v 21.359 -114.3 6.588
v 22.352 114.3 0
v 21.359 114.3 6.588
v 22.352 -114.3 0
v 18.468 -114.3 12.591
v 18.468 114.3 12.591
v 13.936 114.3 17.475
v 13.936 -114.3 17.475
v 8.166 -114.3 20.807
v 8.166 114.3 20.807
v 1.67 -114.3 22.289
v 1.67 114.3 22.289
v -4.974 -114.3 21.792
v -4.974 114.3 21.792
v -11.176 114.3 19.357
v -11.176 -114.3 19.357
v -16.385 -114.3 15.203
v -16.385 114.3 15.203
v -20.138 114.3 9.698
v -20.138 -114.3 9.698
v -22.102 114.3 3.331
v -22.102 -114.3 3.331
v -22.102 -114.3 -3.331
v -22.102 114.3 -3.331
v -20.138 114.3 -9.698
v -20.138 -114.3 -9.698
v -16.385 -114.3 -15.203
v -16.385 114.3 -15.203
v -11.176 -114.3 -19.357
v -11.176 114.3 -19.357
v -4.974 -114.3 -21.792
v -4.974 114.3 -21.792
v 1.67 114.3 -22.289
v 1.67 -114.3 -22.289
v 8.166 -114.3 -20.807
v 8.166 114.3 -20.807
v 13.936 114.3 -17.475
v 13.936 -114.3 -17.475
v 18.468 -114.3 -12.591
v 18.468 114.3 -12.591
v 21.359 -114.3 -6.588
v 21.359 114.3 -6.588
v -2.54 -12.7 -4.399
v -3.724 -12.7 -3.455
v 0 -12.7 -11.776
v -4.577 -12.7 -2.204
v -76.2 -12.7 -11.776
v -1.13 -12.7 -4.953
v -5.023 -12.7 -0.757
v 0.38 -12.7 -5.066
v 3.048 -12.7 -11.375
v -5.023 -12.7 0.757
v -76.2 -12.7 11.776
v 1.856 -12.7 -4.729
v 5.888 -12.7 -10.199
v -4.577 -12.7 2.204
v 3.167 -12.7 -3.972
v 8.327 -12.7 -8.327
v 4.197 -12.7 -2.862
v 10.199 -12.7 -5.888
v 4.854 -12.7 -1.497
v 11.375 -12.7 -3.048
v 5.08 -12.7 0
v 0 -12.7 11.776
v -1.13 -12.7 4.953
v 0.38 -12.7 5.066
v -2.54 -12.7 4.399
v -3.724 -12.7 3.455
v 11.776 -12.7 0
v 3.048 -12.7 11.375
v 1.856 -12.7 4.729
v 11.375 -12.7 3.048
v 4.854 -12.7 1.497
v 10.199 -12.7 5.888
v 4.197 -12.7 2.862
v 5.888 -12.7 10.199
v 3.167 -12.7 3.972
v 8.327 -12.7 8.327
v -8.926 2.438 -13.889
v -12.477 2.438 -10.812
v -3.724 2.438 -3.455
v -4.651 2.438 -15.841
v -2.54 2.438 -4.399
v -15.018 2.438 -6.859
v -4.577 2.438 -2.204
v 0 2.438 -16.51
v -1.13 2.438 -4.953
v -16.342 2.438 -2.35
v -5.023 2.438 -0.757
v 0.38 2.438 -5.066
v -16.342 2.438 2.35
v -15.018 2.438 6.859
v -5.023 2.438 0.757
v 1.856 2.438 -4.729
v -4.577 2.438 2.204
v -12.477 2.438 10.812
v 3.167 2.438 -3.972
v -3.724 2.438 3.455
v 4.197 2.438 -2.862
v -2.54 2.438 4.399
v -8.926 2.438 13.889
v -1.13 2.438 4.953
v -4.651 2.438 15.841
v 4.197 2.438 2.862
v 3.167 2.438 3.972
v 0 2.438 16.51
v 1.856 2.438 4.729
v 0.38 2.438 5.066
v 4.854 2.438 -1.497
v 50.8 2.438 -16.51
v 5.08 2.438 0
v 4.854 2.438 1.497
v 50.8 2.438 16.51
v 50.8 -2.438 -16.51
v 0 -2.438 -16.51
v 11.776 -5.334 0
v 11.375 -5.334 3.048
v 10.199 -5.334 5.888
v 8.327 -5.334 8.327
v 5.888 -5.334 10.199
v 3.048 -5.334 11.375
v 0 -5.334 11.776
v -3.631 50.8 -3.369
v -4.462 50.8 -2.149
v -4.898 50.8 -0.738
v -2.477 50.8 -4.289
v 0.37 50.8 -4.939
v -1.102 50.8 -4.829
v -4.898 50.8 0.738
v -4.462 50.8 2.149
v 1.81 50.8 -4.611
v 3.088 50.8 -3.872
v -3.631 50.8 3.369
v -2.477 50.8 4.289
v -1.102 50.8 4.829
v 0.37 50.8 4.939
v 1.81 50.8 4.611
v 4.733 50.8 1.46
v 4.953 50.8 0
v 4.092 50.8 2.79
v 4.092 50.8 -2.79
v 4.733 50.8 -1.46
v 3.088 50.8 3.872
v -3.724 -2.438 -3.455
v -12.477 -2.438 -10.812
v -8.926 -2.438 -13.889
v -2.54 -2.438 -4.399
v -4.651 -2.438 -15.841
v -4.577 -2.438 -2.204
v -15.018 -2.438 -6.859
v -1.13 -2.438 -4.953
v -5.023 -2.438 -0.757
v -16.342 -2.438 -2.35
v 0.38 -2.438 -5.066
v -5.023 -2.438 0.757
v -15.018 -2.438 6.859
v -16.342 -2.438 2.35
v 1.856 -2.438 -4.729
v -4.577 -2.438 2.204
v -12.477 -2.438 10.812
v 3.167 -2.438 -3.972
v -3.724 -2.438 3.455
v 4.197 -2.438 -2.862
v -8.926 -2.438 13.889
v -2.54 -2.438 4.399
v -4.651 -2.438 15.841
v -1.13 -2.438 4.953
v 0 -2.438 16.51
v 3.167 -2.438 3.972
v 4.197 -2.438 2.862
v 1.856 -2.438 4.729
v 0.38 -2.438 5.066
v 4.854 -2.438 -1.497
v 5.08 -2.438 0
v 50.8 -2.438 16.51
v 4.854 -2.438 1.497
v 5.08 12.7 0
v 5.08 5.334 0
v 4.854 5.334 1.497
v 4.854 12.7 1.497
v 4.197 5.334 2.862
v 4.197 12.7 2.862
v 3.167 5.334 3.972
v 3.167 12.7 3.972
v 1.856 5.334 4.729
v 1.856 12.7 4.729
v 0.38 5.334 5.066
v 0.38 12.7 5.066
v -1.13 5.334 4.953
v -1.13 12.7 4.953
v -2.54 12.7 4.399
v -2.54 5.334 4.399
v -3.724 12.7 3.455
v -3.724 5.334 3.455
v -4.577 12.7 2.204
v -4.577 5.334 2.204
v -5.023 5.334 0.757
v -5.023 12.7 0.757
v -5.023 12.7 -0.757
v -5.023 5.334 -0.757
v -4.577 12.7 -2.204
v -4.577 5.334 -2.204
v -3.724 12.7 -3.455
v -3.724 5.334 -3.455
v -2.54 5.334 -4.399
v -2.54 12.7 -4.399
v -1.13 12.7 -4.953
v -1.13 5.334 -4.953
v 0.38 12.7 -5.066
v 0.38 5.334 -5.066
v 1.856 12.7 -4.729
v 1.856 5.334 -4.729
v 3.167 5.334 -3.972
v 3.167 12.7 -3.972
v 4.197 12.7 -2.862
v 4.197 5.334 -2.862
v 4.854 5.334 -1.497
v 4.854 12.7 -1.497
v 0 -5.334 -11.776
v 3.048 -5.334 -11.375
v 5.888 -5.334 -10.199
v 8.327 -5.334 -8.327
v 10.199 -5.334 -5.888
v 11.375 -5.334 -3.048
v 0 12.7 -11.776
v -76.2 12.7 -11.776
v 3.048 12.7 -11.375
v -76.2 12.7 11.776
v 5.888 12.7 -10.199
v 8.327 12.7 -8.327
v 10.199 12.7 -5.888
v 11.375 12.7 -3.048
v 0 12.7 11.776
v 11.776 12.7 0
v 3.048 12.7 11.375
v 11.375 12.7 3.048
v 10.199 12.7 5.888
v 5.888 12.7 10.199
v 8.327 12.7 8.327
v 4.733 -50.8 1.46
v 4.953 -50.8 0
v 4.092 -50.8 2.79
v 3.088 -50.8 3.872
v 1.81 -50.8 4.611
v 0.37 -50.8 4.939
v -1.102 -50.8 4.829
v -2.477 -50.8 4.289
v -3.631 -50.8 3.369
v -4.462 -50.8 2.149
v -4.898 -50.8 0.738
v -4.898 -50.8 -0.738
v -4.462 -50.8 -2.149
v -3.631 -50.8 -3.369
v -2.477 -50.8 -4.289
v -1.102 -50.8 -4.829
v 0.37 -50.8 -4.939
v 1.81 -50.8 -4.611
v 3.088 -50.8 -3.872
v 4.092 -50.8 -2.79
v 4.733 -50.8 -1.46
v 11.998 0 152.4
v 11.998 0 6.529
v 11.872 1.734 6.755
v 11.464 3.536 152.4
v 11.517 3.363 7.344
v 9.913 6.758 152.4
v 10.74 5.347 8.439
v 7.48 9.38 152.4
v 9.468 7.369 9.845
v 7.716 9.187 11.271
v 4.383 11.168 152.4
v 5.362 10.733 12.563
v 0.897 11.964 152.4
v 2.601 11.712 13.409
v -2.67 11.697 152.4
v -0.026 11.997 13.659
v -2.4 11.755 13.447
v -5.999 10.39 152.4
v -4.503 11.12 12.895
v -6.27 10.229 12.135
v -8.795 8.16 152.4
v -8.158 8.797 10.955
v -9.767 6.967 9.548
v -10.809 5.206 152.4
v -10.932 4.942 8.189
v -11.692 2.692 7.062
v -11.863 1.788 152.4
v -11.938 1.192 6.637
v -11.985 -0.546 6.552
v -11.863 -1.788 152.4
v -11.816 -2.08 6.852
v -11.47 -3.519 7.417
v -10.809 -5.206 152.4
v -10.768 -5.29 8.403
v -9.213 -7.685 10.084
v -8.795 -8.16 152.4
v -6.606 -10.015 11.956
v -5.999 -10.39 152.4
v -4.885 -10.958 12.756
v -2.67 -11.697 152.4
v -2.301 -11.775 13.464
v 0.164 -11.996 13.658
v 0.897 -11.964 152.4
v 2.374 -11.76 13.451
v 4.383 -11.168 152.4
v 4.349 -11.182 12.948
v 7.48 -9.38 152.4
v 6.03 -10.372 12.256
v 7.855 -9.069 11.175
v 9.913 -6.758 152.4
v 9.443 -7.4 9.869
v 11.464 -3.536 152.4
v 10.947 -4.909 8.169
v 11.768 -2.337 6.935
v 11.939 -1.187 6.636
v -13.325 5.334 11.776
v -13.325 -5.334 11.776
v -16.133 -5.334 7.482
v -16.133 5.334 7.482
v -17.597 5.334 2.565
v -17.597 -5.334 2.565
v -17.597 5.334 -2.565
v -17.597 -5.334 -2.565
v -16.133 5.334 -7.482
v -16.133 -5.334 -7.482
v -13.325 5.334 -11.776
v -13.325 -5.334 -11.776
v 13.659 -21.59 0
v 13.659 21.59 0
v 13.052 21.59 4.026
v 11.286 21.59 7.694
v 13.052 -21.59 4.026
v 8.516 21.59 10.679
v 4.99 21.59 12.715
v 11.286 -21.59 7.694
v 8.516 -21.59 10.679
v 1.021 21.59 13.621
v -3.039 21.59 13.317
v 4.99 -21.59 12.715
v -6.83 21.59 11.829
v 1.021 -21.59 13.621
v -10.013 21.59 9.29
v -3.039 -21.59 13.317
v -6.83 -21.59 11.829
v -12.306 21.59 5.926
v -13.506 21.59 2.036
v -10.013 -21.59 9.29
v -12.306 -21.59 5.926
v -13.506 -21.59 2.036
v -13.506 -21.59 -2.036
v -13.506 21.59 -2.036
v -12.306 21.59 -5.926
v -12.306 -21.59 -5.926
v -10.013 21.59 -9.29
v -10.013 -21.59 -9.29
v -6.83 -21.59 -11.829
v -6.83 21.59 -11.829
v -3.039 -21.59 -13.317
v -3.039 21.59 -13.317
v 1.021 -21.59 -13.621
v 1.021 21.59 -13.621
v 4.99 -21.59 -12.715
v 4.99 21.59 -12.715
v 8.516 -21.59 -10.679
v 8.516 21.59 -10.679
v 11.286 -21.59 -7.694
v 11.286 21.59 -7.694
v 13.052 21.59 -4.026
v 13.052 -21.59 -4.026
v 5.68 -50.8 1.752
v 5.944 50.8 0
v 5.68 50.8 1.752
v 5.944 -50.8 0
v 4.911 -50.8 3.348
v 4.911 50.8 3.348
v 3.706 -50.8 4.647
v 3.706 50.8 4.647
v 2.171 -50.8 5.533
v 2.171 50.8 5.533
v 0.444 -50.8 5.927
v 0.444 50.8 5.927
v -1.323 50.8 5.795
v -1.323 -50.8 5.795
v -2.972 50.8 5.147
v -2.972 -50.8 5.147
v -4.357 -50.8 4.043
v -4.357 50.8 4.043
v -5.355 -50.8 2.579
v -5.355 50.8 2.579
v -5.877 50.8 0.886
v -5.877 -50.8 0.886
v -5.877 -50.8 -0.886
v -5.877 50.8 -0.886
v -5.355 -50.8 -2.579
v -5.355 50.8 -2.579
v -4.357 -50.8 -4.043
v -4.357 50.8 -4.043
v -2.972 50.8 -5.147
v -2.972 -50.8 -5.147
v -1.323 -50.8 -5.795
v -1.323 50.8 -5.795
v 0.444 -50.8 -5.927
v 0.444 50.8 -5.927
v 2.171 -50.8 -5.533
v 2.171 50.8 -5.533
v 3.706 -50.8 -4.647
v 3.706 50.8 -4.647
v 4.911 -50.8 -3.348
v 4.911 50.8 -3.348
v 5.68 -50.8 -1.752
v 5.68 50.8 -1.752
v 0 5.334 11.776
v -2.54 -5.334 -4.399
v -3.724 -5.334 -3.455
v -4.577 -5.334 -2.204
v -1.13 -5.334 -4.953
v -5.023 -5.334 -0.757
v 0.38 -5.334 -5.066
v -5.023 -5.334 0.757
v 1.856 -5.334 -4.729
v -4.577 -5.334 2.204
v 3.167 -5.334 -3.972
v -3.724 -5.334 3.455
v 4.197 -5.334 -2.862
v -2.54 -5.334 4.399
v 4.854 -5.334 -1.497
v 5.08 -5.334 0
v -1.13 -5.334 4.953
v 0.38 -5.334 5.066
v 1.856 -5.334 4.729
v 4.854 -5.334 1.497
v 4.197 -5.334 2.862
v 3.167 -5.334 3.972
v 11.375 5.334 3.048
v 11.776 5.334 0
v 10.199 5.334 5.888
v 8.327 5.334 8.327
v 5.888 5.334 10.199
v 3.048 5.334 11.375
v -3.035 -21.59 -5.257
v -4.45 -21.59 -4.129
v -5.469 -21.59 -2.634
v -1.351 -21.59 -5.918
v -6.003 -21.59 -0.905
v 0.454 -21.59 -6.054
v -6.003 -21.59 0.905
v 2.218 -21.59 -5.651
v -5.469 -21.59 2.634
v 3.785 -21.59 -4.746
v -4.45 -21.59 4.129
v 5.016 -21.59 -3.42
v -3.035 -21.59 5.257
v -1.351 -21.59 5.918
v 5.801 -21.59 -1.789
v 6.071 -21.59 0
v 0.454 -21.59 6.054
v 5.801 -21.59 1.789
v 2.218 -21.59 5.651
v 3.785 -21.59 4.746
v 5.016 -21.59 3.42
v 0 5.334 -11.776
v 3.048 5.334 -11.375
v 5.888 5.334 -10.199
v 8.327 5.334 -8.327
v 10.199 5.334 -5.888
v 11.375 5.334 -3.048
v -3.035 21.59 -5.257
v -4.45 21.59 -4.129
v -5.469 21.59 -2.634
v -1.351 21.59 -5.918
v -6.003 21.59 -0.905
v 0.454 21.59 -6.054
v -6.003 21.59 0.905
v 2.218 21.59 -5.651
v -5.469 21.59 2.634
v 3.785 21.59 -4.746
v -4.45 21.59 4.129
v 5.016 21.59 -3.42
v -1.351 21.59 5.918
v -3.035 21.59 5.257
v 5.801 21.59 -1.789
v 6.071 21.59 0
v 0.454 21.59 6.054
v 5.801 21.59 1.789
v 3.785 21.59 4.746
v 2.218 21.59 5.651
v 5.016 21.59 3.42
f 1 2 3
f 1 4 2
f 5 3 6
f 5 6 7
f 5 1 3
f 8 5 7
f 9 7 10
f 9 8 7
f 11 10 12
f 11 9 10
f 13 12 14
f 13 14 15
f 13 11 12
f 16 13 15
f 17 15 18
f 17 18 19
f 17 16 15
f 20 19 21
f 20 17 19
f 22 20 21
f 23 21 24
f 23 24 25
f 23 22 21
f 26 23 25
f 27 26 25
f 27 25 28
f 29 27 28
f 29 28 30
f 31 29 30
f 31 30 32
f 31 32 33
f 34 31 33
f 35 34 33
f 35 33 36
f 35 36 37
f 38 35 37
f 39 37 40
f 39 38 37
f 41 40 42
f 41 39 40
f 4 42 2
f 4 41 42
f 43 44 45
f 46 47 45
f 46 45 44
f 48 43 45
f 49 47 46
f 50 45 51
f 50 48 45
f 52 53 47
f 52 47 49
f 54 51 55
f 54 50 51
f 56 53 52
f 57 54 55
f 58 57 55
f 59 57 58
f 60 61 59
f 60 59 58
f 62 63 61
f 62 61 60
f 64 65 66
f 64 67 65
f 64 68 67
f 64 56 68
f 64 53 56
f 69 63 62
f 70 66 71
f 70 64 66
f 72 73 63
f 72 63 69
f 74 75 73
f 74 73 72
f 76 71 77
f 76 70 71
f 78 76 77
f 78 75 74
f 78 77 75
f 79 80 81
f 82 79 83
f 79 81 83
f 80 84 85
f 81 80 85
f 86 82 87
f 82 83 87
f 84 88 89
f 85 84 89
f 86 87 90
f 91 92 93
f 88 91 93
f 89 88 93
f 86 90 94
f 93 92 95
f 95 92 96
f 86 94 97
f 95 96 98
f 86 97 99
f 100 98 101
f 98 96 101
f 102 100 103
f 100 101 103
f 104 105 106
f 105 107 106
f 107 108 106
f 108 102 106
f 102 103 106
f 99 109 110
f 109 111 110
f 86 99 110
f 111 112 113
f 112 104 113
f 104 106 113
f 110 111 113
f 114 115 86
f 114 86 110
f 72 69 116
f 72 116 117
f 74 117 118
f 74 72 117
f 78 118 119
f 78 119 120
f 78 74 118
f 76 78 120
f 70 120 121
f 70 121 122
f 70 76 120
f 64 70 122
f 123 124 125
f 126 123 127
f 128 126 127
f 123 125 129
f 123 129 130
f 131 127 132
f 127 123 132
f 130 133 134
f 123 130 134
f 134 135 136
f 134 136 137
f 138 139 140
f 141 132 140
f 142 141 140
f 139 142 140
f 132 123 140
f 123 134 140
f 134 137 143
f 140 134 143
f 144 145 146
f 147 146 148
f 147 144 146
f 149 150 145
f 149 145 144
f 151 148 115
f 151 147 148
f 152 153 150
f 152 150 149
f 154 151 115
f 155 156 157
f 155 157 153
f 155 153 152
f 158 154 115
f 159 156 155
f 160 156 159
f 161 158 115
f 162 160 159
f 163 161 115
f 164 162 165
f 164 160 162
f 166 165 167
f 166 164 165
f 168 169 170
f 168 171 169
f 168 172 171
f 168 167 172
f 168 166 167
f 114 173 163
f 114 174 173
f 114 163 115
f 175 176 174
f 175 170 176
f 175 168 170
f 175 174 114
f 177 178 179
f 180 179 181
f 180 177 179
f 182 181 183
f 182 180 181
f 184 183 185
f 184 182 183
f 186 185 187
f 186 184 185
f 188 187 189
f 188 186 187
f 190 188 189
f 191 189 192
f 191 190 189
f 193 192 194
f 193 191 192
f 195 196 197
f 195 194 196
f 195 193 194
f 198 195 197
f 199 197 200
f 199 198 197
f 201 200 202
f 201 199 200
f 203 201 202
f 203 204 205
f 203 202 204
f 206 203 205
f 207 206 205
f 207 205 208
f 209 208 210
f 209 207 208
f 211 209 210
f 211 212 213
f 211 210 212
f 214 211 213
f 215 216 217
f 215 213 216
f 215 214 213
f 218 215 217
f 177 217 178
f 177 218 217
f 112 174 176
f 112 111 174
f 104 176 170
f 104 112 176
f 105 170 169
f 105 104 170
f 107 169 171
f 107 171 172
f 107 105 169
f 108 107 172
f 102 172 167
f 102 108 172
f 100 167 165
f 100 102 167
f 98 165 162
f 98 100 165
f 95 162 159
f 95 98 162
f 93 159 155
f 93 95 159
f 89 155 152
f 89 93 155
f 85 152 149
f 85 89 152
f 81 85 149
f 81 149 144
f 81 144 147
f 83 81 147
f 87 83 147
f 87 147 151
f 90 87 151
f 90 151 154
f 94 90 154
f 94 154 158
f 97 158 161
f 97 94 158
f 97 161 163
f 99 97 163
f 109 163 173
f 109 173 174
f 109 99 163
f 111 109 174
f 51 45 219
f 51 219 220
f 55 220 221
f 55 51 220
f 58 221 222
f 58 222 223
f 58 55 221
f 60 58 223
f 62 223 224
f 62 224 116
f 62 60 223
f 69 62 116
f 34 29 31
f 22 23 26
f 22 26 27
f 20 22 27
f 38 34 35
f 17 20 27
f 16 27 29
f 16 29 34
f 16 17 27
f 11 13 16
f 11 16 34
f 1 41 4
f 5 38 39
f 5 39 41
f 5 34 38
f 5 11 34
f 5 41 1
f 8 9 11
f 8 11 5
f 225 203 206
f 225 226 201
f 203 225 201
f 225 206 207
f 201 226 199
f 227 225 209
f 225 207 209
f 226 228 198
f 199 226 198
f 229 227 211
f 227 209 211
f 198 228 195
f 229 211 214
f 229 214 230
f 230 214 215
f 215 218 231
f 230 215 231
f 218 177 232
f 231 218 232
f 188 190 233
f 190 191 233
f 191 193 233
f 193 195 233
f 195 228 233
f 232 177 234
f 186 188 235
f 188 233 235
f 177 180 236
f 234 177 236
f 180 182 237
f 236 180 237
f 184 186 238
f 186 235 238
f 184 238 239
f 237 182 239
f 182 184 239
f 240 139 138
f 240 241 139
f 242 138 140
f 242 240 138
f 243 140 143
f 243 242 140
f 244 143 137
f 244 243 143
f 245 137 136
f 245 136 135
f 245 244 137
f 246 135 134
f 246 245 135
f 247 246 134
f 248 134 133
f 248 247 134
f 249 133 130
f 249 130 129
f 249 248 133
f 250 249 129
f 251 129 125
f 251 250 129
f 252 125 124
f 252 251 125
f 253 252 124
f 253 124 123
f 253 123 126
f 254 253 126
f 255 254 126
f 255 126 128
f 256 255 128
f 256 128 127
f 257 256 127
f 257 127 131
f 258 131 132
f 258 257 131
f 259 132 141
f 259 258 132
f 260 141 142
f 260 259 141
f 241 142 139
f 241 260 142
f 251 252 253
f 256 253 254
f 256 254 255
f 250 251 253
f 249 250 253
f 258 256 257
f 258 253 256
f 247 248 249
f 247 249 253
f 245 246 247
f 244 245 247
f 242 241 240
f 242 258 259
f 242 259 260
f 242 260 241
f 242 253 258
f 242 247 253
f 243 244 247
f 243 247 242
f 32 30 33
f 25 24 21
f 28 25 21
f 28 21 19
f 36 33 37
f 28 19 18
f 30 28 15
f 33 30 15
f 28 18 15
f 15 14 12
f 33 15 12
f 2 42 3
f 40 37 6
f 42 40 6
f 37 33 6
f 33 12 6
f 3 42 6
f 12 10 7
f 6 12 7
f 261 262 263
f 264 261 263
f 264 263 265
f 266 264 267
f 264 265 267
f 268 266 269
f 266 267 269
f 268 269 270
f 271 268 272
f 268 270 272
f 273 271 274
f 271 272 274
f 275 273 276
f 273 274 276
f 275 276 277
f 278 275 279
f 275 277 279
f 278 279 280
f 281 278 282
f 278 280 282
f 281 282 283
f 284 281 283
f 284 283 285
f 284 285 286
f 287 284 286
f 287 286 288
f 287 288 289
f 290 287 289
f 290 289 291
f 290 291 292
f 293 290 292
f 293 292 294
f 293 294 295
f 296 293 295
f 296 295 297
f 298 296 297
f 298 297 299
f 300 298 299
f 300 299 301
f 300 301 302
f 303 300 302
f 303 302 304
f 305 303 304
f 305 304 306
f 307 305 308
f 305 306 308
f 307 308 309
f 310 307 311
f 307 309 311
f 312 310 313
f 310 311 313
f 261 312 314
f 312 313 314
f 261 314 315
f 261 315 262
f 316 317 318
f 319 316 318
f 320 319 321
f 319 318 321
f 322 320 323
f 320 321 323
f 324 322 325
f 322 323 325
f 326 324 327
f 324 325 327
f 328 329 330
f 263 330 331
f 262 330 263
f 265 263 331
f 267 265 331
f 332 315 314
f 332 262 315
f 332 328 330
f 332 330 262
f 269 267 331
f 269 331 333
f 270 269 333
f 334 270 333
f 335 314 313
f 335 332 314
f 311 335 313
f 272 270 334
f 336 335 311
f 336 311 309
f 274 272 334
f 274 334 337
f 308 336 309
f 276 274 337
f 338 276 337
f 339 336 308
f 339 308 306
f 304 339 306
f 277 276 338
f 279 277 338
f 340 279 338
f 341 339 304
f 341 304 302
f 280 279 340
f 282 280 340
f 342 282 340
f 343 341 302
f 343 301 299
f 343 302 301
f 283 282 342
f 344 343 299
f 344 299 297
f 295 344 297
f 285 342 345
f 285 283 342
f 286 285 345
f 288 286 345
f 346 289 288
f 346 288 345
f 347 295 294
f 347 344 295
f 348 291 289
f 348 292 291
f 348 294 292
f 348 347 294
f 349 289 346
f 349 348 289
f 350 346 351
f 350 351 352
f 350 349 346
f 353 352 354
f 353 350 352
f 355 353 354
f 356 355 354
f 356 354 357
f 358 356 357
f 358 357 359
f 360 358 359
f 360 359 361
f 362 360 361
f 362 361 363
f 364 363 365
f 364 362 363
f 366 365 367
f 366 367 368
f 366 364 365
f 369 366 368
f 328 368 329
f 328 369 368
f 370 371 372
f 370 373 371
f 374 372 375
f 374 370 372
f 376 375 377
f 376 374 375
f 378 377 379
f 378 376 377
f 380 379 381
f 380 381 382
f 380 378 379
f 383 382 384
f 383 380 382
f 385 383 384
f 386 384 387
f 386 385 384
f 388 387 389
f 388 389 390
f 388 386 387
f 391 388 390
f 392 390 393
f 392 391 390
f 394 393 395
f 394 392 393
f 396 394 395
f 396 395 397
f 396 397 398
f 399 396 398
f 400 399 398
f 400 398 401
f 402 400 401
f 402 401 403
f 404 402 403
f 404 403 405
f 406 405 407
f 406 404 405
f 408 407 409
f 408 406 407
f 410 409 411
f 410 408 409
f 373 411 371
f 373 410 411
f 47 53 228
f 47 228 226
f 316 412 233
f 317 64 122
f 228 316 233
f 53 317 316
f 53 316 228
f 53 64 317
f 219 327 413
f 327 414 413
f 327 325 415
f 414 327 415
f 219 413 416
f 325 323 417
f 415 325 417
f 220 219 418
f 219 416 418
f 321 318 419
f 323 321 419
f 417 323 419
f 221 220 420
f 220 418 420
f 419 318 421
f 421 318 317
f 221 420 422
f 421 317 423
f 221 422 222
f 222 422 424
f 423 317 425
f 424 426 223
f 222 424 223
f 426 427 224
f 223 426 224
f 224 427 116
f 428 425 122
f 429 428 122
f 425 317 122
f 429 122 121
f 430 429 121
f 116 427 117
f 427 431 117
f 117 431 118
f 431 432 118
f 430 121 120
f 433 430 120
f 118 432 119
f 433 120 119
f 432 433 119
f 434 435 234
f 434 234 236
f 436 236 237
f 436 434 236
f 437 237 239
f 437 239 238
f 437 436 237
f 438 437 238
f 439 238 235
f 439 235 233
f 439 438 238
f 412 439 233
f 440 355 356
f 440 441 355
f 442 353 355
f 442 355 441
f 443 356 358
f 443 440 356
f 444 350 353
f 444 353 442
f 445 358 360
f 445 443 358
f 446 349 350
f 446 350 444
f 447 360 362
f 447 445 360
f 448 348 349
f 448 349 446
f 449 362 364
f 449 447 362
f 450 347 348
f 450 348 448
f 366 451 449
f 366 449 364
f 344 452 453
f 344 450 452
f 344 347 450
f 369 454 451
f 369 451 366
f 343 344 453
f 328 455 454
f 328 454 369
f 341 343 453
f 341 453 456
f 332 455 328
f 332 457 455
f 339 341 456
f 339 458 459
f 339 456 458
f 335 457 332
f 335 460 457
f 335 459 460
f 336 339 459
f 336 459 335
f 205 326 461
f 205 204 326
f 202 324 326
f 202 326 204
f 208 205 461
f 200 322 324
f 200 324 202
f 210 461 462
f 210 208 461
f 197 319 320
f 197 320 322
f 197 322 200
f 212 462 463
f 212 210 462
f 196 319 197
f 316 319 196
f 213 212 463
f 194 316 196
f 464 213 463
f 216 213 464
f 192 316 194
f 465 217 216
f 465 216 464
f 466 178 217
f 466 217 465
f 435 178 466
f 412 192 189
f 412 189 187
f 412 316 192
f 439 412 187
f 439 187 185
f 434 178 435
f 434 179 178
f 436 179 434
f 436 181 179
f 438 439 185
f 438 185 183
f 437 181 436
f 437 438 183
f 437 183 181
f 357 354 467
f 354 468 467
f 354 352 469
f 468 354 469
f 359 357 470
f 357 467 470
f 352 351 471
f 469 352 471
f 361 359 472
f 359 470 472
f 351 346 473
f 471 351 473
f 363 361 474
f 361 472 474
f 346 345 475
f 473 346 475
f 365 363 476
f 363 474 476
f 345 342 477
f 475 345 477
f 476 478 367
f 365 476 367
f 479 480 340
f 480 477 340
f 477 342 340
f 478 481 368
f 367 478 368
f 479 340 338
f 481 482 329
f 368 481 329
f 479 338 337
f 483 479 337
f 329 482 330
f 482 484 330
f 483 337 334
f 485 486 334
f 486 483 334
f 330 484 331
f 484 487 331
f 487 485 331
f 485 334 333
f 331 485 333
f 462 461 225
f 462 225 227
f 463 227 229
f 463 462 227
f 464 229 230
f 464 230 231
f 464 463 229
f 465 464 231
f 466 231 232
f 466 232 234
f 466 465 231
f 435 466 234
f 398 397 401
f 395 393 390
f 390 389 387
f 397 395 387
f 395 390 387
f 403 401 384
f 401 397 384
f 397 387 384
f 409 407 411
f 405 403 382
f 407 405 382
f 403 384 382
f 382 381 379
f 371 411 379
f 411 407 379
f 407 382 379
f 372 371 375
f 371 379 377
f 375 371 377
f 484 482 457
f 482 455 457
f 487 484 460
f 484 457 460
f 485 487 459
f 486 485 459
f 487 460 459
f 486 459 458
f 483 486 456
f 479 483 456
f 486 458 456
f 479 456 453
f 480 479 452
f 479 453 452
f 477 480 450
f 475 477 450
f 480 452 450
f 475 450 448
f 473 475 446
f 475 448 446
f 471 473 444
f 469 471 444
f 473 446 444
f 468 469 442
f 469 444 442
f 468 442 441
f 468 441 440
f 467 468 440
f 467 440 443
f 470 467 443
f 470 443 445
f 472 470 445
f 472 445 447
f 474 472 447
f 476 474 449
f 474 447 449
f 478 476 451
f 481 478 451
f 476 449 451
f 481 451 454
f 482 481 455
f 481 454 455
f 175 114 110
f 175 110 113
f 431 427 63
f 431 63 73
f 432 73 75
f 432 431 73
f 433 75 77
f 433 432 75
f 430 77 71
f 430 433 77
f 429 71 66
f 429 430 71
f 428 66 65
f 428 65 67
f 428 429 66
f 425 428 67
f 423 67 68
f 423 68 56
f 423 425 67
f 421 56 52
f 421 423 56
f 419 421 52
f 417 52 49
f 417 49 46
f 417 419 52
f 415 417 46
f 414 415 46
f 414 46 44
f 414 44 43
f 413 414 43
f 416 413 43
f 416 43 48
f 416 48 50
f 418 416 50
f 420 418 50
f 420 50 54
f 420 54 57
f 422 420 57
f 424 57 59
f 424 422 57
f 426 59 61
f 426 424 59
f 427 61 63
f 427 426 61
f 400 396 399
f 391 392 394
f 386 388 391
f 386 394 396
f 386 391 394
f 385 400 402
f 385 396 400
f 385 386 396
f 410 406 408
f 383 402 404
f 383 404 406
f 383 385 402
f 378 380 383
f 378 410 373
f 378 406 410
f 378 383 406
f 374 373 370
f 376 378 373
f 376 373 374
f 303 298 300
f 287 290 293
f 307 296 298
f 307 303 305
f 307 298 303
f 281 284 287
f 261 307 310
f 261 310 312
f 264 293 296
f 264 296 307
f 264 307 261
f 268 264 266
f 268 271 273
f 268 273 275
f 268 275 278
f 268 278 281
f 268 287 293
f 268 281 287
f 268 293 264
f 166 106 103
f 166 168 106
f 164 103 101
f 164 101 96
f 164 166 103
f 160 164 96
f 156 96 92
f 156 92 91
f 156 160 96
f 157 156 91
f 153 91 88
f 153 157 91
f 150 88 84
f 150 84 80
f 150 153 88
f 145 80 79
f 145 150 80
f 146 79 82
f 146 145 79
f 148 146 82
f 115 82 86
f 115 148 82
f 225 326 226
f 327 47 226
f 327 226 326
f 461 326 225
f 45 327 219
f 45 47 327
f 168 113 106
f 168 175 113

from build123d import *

# Parameters (mm, degrees)
F0_R      = 22.352
F1_DEPTH  = 114.3
F2_R      = 4.953
F3_DEPTH  = 50.8
F4_R      = 5.9436
F5_DEPTH  = 50.8
F6_R      = 5.08
F7_DEPTH  = 2.4384
F8_R      = 5.08
F9_DEPTH  = 12.7
F10_R     = 17.7833495677
F11_DEPTH = 5.334
F12_R     = 13.6590110192
F13_DEPTH = 21.59
F14_R     = 11.9975006325
F15_DEPTH = 152.4
F16_R     = 6.0706
F17_DEPTH = 127


with BuildPart() as f1:
    # F0 (on Front) → F1 (new body, symmetric)
    with BuildSketch(Plane.XZ):
        Circle(F0_R)
    extrude(amount=F1_DEPTH, both=True)


with BuildPart() as f3:
    # F2 (on Front) → F3 (new body, symmetric)
    with BuildSketch(Plane.XZ):
        Circle(F2_R)
    extrude(amount=F3_DEPTH, both=True)


with BuildPart() as f5:
    # F4 (on Front) → F5 (new body, symmetric)
    with BuildSketch(Plane.XZ):
        Circle(F4_R)
    extrude(amount=F5_DEPTH, both=True)


with BuildPart() as f7:
    # F6 (on Front) → F7 (new body, symmetric)
    with BuildSketch(Plane.XZ):
        with BuildLine():
            ThreePointArc((0, -16.51), (11.6743329574, -11.6743329574), (16.51, 0))
            ThreePointArc((16.51, 0), (11.6743329574, 11.6743329574), (0, 16.51))
            ThreePointArc((0, 16.51), (-16.51, 0), (0, -16.51))
        make_face()
        Circle(F6_R, mode=Mode.SUBTRACT)
        with BuildLine():
            ThreePointArc((0, 16.51), (11.6743329574, 11.6743329574), (16.51, 0))
            ThreePointArc((16.51, 0), (11.6743329574, -11.6743329574), (0, -16.51))
            Line((0, -16.51), (50.8, -16.51))
            Line((50.8, -16.51), (50.8, 16.51))
            Line((50.8, 16.51), (0, 16.51))
        make_face()
    extrude(amount=F7_DEPTH, both=True)


with BuildPart() as f9:
    # F8 (on Front) → F9 (new body, symmetric)
    with BuildSketch(Plane.XZ):
        with BuildLine():
            ThreePointArc((0, -11.776358387), (-11.776358387, 0), (0, 11.776358387))
            Line((0, 11.776358387), (-76.2, 11.776358387))
            Line((-76.2, 11.776358387), (-76.2, -11.776358387))
            Line((-76.2, -11.776358387), (0, -11.776358387))
        make_face()
        with BuildLine():
            ThreePointArc((0, -11.776358387), (8.3271428731, -8.3271428731), (11.776358387, 0))
            ThreePointArc((11.776358387, 0), (8.3271428731, 8.3271428731), (0, 11.776358387))
            ThreePointArc((0, 11.776358387), (-11.776358387, 0), (0, -11.776358387))
        make_face()
        Circle(F8_R, mode=Mode.SUBTRACT)
    extrude(amount=F9_DEPTH, both=True)

    # F10 (on Front) → F11 (cut, symmetric)
    with BuildSketch(Plane.XZ):
        Circle(F10_R)
    extrude(amount=F11_DEPTH, both=True, mode=Mode.SUBTRACT)


with BuildPart() as f13:
    # F12 (on Front) → F13 (new body, symmetric)
    with BuildSketch(Plane.XZ):
        Circle(F12_R)
    extrude(amount=F13_DEPTH, both=True)

    # F14 (on Top) → F15 (join)
    with BuildSketch(Plane.XY):
        Circle(F14_R)
    extrude(amount=F15_DEPTH)

    # F16 (on Front) → F17 (cut, symmetric)
    with BuildSketch(Plane.XZ):
        Circle(F16_R)
    extrude(amount=F17_DEPTH, both=True, mode=Mode.SUBTRACT)


solid = Compound([f1.part, f3.part, f5.part, f7.part, f9.part, f13.part])
